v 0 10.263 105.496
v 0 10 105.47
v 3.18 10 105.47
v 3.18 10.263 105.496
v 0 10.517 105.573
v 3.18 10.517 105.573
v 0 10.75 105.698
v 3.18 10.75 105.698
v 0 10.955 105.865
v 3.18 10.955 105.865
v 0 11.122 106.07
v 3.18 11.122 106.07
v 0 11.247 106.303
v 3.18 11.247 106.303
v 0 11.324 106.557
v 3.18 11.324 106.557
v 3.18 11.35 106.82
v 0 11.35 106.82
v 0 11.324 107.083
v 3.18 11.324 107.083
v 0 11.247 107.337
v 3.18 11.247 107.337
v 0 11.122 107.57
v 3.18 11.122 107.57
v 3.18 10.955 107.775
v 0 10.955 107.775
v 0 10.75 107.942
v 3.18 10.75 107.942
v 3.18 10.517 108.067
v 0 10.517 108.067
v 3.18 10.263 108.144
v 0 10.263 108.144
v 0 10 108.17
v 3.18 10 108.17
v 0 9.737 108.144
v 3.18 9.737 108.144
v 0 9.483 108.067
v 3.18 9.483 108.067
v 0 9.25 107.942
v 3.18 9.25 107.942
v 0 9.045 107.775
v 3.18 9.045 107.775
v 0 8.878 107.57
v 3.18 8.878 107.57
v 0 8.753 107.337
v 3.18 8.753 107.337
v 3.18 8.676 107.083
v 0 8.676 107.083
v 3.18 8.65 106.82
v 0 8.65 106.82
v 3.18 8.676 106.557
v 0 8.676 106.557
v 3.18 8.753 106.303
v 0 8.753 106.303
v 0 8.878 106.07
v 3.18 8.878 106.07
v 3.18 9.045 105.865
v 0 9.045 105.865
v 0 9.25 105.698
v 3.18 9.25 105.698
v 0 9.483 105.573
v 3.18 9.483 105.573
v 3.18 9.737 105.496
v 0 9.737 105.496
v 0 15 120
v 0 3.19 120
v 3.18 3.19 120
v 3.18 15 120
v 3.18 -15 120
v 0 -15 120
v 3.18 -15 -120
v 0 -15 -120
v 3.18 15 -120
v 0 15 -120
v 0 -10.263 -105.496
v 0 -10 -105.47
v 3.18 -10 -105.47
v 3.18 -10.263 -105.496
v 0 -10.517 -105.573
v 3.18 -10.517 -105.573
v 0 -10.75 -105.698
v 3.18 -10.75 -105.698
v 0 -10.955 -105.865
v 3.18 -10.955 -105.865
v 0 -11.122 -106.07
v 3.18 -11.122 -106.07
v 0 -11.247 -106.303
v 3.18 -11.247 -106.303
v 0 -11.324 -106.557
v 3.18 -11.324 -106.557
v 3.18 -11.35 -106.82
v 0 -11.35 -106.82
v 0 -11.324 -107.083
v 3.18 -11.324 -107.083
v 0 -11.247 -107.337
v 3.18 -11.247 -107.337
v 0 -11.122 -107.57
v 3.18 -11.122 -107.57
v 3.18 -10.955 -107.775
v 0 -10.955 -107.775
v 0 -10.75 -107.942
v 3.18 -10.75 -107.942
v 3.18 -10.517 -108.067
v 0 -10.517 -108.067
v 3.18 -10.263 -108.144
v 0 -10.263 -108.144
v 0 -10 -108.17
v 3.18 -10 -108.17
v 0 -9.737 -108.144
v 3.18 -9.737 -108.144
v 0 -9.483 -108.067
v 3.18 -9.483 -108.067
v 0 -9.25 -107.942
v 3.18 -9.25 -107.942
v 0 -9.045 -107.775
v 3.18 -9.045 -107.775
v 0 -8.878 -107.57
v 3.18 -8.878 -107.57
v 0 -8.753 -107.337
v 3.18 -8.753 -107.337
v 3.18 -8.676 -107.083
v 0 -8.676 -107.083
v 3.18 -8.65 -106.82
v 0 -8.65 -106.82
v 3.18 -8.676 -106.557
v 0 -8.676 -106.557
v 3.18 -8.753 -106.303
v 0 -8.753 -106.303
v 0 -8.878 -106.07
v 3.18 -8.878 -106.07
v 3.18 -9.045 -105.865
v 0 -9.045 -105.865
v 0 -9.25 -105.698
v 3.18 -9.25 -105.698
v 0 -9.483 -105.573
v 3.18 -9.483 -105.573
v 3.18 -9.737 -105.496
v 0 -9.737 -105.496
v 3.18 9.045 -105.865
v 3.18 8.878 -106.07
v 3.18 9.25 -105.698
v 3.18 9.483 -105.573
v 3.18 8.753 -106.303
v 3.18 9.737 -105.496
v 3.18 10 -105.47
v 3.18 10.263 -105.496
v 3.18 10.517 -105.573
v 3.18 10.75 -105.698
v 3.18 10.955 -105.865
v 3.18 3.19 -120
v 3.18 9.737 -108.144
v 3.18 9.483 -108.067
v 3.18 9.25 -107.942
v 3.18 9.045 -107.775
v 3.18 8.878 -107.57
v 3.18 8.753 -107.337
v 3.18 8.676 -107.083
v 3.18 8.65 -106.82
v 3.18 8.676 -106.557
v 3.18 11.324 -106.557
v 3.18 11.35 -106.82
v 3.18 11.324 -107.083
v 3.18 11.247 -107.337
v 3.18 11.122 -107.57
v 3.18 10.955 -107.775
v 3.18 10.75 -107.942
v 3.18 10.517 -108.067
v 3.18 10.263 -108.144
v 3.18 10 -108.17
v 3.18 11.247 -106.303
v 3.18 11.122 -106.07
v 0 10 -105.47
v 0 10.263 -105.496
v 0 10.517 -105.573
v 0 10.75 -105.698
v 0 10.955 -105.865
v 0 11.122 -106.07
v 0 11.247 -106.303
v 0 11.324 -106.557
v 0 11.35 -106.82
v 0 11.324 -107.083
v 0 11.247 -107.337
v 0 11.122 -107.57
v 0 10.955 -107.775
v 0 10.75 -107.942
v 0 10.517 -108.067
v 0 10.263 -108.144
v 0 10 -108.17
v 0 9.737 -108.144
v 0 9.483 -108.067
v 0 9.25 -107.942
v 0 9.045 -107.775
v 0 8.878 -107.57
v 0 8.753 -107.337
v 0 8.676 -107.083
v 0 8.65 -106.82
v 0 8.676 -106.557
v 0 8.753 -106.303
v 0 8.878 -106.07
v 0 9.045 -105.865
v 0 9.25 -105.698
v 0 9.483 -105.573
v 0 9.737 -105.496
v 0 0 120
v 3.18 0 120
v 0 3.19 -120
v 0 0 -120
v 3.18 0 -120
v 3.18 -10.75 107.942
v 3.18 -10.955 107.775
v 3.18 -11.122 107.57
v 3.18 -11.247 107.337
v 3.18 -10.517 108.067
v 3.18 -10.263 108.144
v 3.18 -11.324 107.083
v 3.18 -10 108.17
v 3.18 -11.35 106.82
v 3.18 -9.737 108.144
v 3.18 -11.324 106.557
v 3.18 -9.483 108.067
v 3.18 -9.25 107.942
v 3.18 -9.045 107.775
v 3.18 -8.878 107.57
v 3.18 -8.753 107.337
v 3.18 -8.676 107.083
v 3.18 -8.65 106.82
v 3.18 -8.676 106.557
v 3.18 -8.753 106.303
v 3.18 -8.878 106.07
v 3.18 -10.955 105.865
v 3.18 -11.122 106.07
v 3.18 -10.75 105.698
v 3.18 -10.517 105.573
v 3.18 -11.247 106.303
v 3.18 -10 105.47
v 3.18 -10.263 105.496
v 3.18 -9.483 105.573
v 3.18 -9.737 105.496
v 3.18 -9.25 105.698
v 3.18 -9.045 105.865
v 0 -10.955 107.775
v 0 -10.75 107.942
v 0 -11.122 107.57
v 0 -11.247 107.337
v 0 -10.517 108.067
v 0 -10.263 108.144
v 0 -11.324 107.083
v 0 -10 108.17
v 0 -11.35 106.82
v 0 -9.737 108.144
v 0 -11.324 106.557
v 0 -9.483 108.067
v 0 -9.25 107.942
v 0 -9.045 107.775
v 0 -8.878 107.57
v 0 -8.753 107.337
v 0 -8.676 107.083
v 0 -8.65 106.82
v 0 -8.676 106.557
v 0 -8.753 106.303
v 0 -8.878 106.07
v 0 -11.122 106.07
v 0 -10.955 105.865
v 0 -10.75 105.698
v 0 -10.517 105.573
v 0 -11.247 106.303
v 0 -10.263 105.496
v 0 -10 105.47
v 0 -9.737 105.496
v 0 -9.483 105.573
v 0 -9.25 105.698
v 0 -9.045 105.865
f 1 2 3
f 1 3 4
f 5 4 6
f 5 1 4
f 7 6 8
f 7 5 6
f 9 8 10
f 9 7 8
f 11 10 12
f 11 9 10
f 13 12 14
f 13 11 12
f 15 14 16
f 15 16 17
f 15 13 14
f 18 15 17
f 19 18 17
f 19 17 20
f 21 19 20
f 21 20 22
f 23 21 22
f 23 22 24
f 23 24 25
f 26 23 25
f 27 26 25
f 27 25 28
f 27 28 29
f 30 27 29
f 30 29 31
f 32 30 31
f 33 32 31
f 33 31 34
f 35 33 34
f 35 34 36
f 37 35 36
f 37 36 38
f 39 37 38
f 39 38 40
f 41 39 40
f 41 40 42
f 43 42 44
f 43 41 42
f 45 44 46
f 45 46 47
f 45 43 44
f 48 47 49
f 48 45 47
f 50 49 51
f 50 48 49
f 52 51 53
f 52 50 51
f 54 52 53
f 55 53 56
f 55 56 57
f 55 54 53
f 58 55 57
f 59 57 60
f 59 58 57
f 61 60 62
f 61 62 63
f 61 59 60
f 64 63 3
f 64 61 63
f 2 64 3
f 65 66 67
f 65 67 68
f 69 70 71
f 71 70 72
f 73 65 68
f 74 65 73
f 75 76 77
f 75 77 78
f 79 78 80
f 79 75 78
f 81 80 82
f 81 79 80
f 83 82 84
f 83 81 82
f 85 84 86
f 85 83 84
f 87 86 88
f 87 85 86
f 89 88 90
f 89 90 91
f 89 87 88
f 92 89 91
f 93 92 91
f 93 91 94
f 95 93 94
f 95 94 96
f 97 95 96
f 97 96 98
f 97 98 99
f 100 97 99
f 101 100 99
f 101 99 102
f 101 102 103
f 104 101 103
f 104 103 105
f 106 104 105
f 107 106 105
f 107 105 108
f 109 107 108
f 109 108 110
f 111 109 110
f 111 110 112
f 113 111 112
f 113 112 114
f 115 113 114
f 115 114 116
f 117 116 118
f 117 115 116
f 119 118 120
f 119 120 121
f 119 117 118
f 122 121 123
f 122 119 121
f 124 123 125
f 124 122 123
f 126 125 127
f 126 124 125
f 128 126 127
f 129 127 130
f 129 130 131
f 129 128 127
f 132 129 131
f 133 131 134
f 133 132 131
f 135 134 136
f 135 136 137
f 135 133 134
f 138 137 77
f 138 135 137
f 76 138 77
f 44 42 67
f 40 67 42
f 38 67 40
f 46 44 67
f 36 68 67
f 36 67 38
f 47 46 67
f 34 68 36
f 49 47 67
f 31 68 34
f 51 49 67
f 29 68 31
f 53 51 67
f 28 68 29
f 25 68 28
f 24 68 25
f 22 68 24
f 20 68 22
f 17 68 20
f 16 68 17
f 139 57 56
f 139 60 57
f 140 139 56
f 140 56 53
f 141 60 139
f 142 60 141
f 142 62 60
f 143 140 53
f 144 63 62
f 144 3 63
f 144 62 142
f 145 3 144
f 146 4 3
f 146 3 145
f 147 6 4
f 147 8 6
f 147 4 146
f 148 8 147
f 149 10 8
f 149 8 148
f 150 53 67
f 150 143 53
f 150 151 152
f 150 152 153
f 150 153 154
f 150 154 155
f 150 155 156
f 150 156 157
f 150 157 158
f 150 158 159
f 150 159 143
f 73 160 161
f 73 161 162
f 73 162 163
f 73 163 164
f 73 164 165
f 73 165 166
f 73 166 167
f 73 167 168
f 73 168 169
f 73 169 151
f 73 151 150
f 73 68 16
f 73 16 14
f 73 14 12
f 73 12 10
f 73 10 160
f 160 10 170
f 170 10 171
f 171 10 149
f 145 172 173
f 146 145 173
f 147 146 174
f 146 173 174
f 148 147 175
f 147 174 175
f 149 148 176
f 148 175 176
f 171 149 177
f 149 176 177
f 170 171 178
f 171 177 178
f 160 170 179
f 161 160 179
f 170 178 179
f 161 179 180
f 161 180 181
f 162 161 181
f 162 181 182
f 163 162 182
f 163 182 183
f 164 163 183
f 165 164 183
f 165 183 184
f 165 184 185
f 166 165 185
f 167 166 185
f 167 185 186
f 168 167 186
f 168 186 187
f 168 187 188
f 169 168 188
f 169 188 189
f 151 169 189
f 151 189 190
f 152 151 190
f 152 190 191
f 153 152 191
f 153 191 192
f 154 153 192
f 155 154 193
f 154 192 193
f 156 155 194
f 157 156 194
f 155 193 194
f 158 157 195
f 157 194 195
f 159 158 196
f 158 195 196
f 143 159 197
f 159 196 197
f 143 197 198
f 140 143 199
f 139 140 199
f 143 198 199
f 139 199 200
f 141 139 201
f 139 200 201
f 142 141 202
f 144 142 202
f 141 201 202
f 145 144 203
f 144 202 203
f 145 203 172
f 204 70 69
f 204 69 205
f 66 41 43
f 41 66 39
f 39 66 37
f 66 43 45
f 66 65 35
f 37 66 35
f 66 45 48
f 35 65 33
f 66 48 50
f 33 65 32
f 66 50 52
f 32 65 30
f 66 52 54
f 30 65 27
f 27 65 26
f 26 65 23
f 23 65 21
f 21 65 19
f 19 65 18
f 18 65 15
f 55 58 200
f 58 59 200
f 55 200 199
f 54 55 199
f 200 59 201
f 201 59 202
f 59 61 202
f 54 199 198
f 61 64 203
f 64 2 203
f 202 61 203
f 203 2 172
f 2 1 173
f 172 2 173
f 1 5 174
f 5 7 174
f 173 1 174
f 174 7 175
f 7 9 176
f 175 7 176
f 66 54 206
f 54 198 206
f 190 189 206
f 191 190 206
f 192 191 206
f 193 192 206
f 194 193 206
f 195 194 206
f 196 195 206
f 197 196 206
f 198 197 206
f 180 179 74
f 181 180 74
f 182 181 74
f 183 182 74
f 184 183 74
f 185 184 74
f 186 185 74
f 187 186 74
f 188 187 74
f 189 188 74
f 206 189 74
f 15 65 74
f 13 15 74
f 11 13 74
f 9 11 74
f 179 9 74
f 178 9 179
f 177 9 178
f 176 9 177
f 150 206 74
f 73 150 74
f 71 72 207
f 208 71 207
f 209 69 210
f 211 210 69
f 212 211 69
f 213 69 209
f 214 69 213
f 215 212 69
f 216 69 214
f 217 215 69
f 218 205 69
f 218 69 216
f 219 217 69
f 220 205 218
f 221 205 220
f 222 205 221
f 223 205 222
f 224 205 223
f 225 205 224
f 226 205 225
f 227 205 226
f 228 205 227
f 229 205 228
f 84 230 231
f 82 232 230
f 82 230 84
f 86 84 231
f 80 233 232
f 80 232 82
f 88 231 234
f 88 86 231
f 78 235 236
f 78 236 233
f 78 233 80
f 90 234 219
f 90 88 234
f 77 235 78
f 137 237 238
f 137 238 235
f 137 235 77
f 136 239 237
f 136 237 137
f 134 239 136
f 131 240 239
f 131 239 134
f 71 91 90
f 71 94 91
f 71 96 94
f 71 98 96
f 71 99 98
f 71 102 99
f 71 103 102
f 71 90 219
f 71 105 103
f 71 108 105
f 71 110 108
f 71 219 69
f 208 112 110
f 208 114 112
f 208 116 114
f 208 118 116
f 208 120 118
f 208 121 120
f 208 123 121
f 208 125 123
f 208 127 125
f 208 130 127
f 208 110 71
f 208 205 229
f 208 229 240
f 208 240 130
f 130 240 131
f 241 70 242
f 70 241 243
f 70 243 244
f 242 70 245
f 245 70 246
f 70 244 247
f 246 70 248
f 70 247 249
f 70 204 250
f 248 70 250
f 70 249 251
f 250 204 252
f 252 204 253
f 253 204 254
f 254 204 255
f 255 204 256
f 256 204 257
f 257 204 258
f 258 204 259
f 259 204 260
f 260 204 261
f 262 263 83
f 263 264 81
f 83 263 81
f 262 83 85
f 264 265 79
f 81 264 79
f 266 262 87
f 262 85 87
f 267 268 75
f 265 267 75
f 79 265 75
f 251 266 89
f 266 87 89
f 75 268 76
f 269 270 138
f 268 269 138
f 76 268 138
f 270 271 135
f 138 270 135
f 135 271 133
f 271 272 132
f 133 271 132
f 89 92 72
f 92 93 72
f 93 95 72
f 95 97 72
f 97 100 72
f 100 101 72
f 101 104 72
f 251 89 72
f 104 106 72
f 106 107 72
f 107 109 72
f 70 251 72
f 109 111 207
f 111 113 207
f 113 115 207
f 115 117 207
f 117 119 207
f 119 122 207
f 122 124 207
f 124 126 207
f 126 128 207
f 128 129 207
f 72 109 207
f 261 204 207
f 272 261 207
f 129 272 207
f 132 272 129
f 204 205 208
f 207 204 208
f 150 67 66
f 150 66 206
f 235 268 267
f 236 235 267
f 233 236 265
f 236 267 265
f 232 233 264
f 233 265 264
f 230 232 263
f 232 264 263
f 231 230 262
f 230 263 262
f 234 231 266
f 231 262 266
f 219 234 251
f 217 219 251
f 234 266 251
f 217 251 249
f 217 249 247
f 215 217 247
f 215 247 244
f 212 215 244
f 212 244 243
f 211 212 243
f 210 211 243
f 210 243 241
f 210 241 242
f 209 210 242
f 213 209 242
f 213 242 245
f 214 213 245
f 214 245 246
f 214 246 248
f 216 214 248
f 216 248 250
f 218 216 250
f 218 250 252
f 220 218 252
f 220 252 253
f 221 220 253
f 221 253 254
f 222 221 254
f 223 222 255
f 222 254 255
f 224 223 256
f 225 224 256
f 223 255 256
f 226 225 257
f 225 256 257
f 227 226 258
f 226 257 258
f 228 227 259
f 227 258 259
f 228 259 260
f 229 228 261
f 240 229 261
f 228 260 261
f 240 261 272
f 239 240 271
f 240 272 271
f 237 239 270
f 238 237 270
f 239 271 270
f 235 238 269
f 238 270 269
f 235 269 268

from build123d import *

# Parameters (mm, degrees)
SKETCH1_W               = 240
SKETCH1_H               = 30
BOSS_EXTRUDE1_DEPTH     = 3.18
CUT_EXTRUDE1_REACH      = 122.976
SKETCH2_R               = 1.35
MIRROR2_COPY_1_REACH    = 122.976
MIRROR2_COPY_1_SKETCH_R = 1.35
SKETCH3_W               = 240
SKETCH3_H               = 3.19
CUT_EXTRUDE2_DEPTH      = 10


with BuildPart() as part:
    # Sketch1 → Boss-Extrude1 (new body)
    with BuildSketch(Plane(origin=(0, 0, 0), x_dir=(0, 0, -1), z_dir=(1, 0, 0))):
        Rectangle(SKETCH1_W, SKETCH1_H)
    extrude(amount=BOSS_EXTRUDE1_DEPTH)

    # Sketch2 → Cut-Extrude1 (cut, up to next)
    with BuildSketch(Plane.ZY, mode=Mode.PRIVATE) as cut_extrude1_sk1:
        with Locations((-106.82, 10)):
            Circle(SKETCH2_R)
    cut_extrude1_tool1 = extrude(cut_extrude1_sk1.sketch, amount=-CUT_EXTRUDE1_REACH, mode=Mode.PRIVATE) & part.part
    cut_extrude1 = cut_extrude1_tool1.solids().sort_by_distance((0, 10, -106.82))[0]
    add(cut_extrude1, mode=Mode.SUBTRACT)

    # Mirror1: Cut-Extrude1 across plane
    add(cut_extrude1.mirror(Plane.ZX), mode=Mode.SUBTRACT)

    # Mirror2: Cut-Extrude1 across plane
    add(cut_extrude1.mirror(Plane.XY), mode=Mode.SUBTRACT)

    # Mirror2 copy 1 sketch → Mirror2 copy 1 (cut, up to next)
    with BuildSketch(Plane(origin=(0, 0, 0), x_dir=(0, 0, -1), z_dir=(-1, 0, 0)), mode=Mode.PRIVATE) as mirror2_copy_1_sk1:
        with Locations((-106.82, 10)):
            Circle(MIRROR2_COPY_1_SKETCH_R)
    mirror2_copy_1_tool1 = extrude(mirror2_copy_1_sk1.sketch, amount=-MIRROR2_COPY_1_REACH, mode=Mode.PRIVATE) & part.part
    add(mirror2_copy_1_tool1.solids().sort_by_distance((0, -10, 106.82))[0], mode=Mode.SUBTRACT)

    # Sketch3 → Cut-Extrude2 (cut)
    with BuildSketch(Plane(origin=(3.18, 0, 0), x_dir=(0, 0, -1), z_dir=(1, 0, 0))):
        with Locations((0, 1.595)):
            Rectangle(SKETCH3_W, SKETCH3_H)
    extrude(amount=-CUT_EXTRUDE2_DEPTH, mode=Mode.SUBTRACT)


with BuildPart() as cut_extrude2_piece_1:
    # of the separate pieces the step leaves, piece 1, a body of its own (cut_extrude2_pieces)
    add(part.part.solids().sort_by_distance((0, -15, 120))[0])


with BuildPart() as cut_extrude2_piece_2:
    # of the separate pieces the step leaves, piece 2, a body of its own (cut_extrude2_pieces)
    add(part.part.solids().sort_by_distance((0, 15, 120))[0])


solid = Compound([cut_extrude2_piece_1.part, cut_extrude2_piece_2.part])
